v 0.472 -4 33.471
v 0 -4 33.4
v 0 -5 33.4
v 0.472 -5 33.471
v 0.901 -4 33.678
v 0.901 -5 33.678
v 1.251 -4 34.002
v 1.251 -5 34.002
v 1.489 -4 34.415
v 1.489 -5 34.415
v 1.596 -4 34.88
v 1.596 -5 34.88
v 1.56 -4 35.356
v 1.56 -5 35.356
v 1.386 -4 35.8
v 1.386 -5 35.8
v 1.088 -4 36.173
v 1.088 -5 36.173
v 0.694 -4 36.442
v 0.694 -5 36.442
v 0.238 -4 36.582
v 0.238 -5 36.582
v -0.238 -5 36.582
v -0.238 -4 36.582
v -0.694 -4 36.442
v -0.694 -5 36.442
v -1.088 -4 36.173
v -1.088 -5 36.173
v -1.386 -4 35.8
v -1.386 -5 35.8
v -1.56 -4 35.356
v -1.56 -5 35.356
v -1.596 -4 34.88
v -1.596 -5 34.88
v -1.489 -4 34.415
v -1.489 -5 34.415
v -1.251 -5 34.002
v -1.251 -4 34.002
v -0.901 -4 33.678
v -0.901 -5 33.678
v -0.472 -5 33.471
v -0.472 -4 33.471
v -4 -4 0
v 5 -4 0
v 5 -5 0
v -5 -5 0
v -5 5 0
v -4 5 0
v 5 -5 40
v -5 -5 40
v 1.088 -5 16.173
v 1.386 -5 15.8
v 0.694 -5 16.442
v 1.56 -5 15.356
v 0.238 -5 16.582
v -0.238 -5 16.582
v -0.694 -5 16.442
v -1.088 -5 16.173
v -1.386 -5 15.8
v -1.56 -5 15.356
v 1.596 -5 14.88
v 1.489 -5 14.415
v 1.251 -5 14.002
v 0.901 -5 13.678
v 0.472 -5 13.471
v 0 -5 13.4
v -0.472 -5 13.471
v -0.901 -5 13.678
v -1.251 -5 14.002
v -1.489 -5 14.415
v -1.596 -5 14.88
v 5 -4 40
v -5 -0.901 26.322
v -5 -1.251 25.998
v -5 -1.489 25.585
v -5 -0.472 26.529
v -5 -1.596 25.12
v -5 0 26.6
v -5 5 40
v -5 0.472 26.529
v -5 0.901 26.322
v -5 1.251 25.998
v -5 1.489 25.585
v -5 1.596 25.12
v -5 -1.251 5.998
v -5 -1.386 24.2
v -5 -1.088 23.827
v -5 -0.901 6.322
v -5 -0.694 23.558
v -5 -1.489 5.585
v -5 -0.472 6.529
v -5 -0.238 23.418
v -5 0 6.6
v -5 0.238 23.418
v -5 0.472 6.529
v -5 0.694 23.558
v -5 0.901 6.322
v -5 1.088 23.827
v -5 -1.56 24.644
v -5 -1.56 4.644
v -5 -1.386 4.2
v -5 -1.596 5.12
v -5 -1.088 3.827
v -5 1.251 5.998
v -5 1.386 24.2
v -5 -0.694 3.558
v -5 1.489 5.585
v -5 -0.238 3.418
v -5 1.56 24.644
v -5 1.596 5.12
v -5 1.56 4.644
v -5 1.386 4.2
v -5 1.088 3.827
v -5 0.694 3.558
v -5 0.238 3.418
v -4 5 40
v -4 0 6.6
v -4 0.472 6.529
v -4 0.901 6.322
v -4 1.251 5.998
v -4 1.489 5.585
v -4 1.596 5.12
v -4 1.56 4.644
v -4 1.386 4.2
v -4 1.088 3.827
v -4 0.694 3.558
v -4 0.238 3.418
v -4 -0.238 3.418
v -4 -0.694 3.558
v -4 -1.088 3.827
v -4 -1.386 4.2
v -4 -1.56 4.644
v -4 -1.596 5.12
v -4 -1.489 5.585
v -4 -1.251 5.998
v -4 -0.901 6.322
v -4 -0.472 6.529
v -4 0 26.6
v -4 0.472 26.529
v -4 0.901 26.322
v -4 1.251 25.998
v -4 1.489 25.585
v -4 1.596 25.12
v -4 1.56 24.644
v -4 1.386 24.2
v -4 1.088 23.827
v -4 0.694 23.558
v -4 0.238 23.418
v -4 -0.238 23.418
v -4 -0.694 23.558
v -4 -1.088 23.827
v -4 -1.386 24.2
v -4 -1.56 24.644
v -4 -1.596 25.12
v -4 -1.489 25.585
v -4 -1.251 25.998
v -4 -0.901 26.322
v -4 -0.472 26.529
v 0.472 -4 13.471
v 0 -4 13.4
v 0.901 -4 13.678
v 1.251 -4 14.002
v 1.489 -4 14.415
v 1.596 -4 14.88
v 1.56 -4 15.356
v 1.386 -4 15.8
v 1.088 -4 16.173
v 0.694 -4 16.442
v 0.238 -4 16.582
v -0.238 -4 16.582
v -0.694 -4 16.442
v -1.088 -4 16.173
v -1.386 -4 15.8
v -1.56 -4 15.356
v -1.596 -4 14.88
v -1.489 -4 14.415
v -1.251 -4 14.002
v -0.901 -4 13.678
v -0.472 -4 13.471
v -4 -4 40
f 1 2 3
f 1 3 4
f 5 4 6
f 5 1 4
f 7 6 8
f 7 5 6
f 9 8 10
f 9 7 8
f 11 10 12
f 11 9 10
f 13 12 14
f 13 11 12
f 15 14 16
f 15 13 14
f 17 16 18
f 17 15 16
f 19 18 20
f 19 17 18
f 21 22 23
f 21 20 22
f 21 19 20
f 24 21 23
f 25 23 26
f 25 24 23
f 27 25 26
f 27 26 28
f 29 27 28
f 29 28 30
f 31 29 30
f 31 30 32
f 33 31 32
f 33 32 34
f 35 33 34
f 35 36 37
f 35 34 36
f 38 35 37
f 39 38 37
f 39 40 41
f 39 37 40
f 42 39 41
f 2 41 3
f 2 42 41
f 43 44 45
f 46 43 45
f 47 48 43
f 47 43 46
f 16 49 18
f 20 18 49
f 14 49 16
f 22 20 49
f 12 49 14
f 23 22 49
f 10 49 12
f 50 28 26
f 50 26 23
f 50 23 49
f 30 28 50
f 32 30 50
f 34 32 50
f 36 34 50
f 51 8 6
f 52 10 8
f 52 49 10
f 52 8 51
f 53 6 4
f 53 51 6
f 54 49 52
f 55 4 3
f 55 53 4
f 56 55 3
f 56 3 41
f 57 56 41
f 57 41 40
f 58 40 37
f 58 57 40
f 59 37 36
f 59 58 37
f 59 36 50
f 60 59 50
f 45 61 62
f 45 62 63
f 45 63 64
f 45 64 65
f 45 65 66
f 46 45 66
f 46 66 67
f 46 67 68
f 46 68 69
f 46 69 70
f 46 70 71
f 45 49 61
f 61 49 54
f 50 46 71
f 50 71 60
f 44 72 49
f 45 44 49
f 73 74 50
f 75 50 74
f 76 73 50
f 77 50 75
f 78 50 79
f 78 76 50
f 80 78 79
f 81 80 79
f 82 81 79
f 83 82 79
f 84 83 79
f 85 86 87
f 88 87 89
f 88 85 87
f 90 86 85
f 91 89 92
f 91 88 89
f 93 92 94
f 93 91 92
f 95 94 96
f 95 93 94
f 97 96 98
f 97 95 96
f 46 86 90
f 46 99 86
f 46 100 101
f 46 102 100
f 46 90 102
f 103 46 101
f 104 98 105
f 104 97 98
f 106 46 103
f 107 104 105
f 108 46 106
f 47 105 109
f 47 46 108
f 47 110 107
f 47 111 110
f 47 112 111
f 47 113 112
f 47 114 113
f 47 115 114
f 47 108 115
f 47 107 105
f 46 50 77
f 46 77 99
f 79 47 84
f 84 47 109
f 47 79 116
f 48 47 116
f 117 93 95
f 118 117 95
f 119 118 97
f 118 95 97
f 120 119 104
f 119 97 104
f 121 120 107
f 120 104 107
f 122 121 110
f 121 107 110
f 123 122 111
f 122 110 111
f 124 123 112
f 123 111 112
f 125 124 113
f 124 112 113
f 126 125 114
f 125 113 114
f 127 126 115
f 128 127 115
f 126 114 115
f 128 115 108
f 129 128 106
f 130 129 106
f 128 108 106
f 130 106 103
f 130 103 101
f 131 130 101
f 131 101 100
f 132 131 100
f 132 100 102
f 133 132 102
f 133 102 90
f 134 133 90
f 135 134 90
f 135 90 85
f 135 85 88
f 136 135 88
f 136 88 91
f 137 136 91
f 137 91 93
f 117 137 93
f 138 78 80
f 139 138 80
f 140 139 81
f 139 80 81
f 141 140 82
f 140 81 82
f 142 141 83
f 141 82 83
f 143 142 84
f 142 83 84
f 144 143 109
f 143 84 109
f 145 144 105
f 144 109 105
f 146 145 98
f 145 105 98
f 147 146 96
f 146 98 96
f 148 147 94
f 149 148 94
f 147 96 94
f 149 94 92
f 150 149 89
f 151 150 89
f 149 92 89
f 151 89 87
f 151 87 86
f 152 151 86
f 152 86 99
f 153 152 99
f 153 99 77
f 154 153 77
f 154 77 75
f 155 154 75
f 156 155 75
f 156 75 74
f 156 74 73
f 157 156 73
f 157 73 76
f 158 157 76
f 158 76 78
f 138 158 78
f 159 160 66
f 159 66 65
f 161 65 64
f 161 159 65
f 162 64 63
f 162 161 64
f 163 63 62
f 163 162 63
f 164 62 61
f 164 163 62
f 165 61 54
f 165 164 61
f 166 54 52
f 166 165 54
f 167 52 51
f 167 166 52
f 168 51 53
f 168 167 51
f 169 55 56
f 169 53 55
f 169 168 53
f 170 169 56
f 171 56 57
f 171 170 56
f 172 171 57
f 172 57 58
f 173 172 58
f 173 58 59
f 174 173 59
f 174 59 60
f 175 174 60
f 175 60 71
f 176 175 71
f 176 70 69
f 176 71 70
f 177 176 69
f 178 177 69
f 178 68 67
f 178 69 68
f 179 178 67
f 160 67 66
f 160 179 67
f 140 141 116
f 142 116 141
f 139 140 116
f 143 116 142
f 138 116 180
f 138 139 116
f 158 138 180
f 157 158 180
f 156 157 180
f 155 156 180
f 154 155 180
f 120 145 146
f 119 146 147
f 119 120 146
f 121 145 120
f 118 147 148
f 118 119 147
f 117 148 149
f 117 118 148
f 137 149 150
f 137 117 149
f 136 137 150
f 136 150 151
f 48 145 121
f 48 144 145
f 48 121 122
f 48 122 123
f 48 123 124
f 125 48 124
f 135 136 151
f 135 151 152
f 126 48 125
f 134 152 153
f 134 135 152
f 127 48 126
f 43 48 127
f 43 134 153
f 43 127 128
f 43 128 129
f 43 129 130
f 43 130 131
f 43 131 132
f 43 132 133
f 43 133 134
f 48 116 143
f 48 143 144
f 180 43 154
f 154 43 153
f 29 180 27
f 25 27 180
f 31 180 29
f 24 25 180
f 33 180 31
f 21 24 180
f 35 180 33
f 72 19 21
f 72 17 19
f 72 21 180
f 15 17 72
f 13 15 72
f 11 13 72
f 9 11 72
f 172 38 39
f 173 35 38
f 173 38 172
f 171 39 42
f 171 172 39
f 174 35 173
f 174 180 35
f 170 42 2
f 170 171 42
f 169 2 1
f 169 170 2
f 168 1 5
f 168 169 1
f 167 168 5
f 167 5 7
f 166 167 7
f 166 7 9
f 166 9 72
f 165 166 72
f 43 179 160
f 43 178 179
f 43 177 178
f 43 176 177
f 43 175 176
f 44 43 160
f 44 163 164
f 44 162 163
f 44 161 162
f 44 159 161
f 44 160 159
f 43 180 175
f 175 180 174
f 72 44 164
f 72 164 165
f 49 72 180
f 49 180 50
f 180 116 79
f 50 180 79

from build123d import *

# Parameters (mm, degrees)
EXTRUDE_1_DEPTH          = 40
CUT_EXTRUDE_1_DEPTH      = 42.533119315
CUT_EXTRUDE_1_DEPTH_BACK = 42.533119315
SKETCH_2_R               = 1.6
SKETCH_3_R               = 1.6
CUT_EXTRUDE_2_DEPTH      = 42.533119315


with BuildPart() as part:
    # ｽｹｯﾁ1 → ﾎﾞｽ - 押し出し1 (new body)
    with BuildSketch(Plane.XY):
        Polygon((-4, 5), (-4, -4), (5, -4), (5, -5), (-5, -5), (-5, 5), align=None)
    extrude(amount=EXTRUDE_1_DEPTH)

    # ｽｹｯﾁ2 → ｶｯﾄ - 押し出し1 (cut, two sides: drawn at the far end of the back side and taken through both)
    with BuildSketch(Plane.XZ.offset(5).offset(-CUT_EXTRUDE_1_DEPTH_BACK)):
        with Locations(Location((0, 15, 0), (0, 0, 270))):
            Circle(SKETCH_2_R)
        with Locations(Location((0, 35, 0), (0, 0, 270))):
            Circle(SKETCH_2_R)
    extrude(amount=CUT_EXTRUDE_1_DEPTH + CUT_EXTRUDE_1_DEPTH_BACK, mode=Mode.SUBTRACT)

    # ｽｹｯﾁ3 → ｶｯﾄ - 押し出し2 (cut, through all)
    with BuildSketch(Plane.ZY.offset(5)):
        with Locations((5, 0)):
            Circle(SKETCH_3_R)
        with Locations((25, 0)):
            Circle(SKETCH_3_R)
    extrude(amount=-CUT_EXTRUDE_2_DEPTH, mode=Mode.SUBTRACT)


solid = part.part
